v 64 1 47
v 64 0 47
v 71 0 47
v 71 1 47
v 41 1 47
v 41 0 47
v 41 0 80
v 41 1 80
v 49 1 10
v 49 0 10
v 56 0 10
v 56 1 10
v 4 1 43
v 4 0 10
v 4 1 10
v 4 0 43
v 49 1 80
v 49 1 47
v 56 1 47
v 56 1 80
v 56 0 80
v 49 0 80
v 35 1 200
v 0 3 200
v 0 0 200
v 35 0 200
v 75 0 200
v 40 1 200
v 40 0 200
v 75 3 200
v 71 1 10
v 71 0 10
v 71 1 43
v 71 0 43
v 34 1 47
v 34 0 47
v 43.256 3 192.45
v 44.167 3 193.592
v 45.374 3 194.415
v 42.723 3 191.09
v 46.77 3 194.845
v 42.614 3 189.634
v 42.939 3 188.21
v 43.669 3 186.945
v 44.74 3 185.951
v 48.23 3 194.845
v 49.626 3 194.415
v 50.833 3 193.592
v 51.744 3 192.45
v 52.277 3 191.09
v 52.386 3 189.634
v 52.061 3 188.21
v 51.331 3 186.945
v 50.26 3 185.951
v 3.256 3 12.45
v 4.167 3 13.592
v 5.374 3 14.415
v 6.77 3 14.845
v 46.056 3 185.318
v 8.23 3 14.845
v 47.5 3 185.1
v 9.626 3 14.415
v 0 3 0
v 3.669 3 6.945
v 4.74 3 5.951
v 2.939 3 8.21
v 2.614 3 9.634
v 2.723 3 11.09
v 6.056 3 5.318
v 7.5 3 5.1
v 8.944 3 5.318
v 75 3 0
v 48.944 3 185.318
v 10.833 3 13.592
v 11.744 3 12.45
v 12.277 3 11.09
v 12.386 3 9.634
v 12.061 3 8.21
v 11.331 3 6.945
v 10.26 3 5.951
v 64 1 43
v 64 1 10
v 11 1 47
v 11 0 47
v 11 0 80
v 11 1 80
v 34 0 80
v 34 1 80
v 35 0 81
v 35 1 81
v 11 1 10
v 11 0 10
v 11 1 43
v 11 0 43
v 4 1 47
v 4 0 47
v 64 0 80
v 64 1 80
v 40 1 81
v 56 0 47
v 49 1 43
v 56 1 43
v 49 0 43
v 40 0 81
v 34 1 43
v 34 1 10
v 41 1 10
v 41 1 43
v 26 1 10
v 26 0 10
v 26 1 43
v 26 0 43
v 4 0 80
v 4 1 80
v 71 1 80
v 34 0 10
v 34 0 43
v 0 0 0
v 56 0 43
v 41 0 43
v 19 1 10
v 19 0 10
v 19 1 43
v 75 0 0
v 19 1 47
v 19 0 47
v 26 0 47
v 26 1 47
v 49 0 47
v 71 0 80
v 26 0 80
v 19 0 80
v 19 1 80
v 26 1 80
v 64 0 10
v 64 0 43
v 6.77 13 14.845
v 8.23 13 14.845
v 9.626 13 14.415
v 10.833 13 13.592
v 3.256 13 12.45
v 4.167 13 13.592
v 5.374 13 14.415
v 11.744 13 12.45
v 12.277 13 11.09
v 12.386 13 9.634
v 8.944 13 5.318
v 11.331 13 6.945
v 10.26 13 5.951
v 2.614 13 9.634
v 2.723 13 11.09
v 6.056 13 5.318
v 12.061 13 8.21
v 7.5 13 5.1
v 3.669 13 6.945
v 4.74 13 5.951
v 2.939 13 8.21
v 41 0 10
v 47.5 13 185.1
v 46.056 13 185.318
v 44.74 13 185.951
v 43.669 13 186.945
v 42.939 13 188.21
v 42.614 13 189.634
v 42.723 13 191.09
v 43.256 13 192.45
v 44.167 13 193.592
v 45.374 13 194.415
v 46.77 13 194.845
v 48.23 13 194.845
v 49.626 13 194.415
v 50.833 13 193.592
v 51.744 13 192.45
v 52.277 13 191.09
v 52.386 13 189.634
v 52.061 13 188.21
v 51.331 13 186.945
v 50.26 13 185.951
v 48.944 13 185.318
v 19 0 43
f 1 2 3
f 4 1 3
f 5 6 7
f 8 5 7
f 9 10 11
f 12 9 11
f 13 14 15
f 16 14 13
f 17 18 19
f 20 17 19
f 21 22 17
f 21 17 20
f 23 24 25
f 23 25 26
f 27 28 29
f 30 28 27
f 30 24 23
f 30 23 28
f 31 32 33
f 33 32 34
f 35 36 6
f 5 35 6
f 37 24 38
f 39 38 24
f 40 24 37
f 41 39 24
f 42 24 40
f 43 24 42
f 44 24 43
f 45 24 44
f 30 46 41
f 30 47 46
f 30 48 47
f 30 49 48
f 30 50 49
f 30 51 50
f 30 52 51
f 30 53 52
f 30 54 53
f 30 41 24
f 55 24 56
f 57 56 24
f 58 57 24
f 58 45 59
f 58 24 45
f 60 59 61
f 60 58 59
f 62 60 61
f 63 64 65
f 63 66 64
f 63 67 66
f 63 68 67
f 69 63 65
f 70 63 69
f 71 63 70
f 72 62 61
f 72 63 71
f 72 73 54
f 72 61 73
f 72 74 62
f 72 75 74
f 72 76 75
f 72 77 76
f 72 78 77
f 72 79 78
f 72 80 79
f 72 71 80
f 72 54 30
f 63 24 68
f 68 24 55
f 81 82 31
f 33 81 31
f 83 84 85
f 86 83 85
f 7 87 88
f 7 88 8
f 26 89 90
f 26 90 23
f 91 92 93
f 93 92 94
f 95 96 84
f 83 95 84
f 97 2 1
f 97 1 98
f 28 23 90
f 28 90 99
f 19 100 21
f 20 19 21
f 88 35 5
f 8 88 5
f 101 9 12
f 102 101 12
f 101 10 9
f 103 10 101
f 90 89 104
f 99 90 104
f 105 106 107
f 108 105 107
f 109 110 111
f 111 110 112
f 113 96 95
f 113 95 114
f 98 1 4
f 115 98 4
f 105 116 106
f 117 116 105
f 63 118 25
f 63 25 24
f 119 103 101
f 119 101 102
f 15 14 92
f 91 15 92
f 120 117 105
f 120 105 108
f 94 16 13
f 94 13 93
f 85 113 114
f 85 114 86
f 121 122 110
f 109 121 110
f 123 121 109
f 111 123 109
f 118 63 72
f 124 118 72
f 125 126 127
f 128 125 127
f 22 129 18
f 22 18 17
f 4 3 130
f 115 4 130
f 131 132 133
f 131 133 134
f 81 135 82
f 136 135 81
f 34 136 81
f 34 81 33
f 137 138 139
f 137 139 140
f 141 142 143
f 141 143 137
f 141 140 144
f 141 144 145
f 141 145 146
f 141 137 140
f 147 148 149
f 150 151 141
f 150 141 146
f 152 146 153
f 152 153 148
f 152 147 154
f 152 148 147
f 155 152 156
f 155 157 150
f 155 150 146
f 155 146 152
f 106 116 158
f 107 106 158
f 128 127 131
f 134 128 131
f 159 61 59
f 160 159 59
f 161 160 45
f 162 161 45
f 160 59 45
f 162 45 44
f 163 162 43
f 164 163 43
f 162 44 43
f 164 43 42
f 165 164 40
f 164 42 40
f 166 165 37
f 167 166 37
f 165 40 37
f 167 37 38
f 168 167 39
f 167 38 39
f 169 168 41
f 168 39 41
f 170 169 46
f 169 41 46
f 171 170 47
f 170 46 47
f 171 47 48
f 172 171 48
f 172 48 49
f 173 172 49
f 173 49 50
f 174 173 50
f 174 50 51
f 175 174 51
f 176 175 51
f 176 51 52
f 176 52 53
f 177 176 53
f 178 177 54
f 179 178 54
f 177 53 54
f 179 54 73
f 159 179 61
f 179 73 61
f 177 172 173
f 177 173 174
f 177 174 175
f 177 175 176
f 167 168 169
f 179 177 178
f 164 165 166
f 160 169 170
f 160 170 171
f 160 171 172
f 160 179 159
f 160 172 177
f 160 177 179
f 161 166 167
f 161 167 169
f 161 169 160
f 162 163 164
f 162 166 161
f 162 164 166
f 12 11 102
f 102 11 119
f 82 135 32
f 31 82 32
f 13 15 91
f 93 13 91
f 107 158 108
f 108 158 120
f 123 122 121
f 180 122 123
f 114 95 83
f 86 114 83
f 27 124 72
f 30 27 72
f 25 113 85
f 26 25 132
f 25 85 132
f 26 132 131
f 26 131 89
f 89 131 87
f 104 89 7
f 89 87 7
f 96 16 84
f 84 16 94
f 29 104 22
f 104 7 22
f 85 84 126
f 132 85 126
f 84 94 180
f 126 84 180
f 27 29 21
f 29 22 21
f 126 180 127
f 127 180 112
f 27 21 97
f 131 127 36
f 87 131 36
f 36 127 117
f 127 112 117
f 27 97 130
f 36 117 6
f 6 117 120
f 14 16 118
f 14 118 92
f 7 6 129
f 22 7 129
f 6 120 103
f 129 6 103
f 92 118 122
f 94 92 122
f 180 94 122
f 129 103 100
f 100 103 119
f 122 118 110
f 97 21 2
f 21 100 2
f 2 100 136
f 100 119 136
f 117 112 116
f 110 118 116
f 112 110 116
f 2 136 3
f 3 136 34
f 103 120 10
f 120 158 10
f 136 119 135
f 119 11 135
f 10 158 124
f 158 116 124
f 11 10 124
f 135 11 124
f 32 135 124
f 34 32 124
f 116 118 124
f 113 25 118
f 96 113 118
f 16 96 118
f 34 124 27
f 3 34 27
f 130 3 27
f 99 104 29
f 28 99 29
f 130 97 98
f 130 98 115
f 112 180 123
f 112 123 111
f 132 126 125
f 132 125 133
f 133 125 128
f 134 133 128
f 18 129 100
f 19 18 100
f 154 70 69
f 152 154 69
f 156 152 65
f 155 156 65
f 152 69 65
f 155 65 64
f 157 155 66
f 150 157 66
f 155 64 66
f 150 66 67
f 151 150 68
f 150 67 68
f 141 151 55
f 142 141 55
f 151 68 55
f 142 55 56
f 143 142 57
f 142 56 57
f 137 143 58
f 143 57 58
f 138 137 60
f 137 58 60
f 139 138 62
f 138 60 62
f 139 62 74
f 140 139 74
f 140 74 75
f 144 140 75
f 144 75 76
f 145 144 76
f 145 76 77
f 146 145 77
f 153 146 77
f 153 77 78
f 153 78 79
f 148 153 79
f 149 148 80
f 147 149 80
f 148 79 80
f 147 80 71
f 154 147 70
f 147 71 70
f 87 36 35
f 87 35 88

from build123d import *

# Parameters (mm, degrees)
SKETCH1_W           = 75
SKETCH1_H           = 3
BOSS_EXTRUDE1_DEPTH = 200
SKETCH2_R           = 4.9
BOSS_EXTRUDE2_DEPTH = 10
SKETCH3_W           = 5
SKETCH3_H           = 119
CUT_EXTRUDE1_DEPTH  = 1
SKETCH4_W           = 7
SKETCH4_H           = 33
CUT_EXTRUDE2_DEPTH  = 1


with BuildPart() as part:
    # Sketch1 → Boss-Extrude1 (new body)
    with BuildSketch(Plane.XY):
        with Locations((37.5, 1.5)):
            Rectangle(SKETCH1_W, SKETCH1_H)
    extrude(amount=BOSS_EXTRUDE1_DEPTH)

    # Sketch2 → Boss-Extrude2 (add)
    with BuildSketch(Plane(origin=(0, 3, 0), x_dir=(1, 0, 0), z_dir=(0, 1, 0))):
        with Locations(Location((7.5, -10, 0), (0, 0, 90))):
            Circle(SKETCH2_R)
        with Locations(Location((47.5, -190, 0), (0, 0, 90))):
            Circle(SKETCH2_R)
    extrude(amount=BOSS_EXTRUDE2_DEPTH)

    # Sketch3 → Cut-Extrude1 (cut)
    with BuildSketch(Plane.XZ):
        with Locations((37.5, 140.5)):
            Rectangle(SKETCH3_W, SKETCH3_H)
    extrude(amount=-CUT_EXTRUDE1_DEPTH, mode=Mode.SUBTRACT)

    # Sketch4 → Cut-Extrude2 (cut)
    with BuildSketch(Plane.XZ):
        with Locations((7.5, 26.5)):
            Rectangle(SKETCH4_W, SKETCH4_H)
        with Locations((7.5, 63.5)):
            Rectangle(SKETCH4_W, SKETCH4_H)
        with Locations((22.5, 26.5)):
            Rectangle(SKETCH4_W, SKETCH4_H)
        with Locations((22.5, 63.5)):
            Rectangle(SKETCH4_W, SKETCH4_H)
        with Locations((37.5, 26.5)):
            Rectangle(SKETCH4_W, SKETCH4_H)
        with Locations((37.5, 63.5)):
            Rectangle(SKETCH4_W, SKETCH4_H)
        with Locations((52.5, 26.5)):
            Rectangle(SKETCH4_W, SKETCH4_H)
        with Locations((52.5, 63.5)):
            Rectangle(SKETCH4_W, SKETCH4_H)
        with Locations((67.5, 26.5)):
            Rectangle(SKETCH4_W, SKETCH4_H)
        with Locations((67.5, 63.5)):
            Rectangle(SKETCH4_W, SKETCH4_H)
    extrude(amount=-CUT_EXTRUDE2_DEPTH, mode=Mode.SUBTRACT)


solid = part.part
